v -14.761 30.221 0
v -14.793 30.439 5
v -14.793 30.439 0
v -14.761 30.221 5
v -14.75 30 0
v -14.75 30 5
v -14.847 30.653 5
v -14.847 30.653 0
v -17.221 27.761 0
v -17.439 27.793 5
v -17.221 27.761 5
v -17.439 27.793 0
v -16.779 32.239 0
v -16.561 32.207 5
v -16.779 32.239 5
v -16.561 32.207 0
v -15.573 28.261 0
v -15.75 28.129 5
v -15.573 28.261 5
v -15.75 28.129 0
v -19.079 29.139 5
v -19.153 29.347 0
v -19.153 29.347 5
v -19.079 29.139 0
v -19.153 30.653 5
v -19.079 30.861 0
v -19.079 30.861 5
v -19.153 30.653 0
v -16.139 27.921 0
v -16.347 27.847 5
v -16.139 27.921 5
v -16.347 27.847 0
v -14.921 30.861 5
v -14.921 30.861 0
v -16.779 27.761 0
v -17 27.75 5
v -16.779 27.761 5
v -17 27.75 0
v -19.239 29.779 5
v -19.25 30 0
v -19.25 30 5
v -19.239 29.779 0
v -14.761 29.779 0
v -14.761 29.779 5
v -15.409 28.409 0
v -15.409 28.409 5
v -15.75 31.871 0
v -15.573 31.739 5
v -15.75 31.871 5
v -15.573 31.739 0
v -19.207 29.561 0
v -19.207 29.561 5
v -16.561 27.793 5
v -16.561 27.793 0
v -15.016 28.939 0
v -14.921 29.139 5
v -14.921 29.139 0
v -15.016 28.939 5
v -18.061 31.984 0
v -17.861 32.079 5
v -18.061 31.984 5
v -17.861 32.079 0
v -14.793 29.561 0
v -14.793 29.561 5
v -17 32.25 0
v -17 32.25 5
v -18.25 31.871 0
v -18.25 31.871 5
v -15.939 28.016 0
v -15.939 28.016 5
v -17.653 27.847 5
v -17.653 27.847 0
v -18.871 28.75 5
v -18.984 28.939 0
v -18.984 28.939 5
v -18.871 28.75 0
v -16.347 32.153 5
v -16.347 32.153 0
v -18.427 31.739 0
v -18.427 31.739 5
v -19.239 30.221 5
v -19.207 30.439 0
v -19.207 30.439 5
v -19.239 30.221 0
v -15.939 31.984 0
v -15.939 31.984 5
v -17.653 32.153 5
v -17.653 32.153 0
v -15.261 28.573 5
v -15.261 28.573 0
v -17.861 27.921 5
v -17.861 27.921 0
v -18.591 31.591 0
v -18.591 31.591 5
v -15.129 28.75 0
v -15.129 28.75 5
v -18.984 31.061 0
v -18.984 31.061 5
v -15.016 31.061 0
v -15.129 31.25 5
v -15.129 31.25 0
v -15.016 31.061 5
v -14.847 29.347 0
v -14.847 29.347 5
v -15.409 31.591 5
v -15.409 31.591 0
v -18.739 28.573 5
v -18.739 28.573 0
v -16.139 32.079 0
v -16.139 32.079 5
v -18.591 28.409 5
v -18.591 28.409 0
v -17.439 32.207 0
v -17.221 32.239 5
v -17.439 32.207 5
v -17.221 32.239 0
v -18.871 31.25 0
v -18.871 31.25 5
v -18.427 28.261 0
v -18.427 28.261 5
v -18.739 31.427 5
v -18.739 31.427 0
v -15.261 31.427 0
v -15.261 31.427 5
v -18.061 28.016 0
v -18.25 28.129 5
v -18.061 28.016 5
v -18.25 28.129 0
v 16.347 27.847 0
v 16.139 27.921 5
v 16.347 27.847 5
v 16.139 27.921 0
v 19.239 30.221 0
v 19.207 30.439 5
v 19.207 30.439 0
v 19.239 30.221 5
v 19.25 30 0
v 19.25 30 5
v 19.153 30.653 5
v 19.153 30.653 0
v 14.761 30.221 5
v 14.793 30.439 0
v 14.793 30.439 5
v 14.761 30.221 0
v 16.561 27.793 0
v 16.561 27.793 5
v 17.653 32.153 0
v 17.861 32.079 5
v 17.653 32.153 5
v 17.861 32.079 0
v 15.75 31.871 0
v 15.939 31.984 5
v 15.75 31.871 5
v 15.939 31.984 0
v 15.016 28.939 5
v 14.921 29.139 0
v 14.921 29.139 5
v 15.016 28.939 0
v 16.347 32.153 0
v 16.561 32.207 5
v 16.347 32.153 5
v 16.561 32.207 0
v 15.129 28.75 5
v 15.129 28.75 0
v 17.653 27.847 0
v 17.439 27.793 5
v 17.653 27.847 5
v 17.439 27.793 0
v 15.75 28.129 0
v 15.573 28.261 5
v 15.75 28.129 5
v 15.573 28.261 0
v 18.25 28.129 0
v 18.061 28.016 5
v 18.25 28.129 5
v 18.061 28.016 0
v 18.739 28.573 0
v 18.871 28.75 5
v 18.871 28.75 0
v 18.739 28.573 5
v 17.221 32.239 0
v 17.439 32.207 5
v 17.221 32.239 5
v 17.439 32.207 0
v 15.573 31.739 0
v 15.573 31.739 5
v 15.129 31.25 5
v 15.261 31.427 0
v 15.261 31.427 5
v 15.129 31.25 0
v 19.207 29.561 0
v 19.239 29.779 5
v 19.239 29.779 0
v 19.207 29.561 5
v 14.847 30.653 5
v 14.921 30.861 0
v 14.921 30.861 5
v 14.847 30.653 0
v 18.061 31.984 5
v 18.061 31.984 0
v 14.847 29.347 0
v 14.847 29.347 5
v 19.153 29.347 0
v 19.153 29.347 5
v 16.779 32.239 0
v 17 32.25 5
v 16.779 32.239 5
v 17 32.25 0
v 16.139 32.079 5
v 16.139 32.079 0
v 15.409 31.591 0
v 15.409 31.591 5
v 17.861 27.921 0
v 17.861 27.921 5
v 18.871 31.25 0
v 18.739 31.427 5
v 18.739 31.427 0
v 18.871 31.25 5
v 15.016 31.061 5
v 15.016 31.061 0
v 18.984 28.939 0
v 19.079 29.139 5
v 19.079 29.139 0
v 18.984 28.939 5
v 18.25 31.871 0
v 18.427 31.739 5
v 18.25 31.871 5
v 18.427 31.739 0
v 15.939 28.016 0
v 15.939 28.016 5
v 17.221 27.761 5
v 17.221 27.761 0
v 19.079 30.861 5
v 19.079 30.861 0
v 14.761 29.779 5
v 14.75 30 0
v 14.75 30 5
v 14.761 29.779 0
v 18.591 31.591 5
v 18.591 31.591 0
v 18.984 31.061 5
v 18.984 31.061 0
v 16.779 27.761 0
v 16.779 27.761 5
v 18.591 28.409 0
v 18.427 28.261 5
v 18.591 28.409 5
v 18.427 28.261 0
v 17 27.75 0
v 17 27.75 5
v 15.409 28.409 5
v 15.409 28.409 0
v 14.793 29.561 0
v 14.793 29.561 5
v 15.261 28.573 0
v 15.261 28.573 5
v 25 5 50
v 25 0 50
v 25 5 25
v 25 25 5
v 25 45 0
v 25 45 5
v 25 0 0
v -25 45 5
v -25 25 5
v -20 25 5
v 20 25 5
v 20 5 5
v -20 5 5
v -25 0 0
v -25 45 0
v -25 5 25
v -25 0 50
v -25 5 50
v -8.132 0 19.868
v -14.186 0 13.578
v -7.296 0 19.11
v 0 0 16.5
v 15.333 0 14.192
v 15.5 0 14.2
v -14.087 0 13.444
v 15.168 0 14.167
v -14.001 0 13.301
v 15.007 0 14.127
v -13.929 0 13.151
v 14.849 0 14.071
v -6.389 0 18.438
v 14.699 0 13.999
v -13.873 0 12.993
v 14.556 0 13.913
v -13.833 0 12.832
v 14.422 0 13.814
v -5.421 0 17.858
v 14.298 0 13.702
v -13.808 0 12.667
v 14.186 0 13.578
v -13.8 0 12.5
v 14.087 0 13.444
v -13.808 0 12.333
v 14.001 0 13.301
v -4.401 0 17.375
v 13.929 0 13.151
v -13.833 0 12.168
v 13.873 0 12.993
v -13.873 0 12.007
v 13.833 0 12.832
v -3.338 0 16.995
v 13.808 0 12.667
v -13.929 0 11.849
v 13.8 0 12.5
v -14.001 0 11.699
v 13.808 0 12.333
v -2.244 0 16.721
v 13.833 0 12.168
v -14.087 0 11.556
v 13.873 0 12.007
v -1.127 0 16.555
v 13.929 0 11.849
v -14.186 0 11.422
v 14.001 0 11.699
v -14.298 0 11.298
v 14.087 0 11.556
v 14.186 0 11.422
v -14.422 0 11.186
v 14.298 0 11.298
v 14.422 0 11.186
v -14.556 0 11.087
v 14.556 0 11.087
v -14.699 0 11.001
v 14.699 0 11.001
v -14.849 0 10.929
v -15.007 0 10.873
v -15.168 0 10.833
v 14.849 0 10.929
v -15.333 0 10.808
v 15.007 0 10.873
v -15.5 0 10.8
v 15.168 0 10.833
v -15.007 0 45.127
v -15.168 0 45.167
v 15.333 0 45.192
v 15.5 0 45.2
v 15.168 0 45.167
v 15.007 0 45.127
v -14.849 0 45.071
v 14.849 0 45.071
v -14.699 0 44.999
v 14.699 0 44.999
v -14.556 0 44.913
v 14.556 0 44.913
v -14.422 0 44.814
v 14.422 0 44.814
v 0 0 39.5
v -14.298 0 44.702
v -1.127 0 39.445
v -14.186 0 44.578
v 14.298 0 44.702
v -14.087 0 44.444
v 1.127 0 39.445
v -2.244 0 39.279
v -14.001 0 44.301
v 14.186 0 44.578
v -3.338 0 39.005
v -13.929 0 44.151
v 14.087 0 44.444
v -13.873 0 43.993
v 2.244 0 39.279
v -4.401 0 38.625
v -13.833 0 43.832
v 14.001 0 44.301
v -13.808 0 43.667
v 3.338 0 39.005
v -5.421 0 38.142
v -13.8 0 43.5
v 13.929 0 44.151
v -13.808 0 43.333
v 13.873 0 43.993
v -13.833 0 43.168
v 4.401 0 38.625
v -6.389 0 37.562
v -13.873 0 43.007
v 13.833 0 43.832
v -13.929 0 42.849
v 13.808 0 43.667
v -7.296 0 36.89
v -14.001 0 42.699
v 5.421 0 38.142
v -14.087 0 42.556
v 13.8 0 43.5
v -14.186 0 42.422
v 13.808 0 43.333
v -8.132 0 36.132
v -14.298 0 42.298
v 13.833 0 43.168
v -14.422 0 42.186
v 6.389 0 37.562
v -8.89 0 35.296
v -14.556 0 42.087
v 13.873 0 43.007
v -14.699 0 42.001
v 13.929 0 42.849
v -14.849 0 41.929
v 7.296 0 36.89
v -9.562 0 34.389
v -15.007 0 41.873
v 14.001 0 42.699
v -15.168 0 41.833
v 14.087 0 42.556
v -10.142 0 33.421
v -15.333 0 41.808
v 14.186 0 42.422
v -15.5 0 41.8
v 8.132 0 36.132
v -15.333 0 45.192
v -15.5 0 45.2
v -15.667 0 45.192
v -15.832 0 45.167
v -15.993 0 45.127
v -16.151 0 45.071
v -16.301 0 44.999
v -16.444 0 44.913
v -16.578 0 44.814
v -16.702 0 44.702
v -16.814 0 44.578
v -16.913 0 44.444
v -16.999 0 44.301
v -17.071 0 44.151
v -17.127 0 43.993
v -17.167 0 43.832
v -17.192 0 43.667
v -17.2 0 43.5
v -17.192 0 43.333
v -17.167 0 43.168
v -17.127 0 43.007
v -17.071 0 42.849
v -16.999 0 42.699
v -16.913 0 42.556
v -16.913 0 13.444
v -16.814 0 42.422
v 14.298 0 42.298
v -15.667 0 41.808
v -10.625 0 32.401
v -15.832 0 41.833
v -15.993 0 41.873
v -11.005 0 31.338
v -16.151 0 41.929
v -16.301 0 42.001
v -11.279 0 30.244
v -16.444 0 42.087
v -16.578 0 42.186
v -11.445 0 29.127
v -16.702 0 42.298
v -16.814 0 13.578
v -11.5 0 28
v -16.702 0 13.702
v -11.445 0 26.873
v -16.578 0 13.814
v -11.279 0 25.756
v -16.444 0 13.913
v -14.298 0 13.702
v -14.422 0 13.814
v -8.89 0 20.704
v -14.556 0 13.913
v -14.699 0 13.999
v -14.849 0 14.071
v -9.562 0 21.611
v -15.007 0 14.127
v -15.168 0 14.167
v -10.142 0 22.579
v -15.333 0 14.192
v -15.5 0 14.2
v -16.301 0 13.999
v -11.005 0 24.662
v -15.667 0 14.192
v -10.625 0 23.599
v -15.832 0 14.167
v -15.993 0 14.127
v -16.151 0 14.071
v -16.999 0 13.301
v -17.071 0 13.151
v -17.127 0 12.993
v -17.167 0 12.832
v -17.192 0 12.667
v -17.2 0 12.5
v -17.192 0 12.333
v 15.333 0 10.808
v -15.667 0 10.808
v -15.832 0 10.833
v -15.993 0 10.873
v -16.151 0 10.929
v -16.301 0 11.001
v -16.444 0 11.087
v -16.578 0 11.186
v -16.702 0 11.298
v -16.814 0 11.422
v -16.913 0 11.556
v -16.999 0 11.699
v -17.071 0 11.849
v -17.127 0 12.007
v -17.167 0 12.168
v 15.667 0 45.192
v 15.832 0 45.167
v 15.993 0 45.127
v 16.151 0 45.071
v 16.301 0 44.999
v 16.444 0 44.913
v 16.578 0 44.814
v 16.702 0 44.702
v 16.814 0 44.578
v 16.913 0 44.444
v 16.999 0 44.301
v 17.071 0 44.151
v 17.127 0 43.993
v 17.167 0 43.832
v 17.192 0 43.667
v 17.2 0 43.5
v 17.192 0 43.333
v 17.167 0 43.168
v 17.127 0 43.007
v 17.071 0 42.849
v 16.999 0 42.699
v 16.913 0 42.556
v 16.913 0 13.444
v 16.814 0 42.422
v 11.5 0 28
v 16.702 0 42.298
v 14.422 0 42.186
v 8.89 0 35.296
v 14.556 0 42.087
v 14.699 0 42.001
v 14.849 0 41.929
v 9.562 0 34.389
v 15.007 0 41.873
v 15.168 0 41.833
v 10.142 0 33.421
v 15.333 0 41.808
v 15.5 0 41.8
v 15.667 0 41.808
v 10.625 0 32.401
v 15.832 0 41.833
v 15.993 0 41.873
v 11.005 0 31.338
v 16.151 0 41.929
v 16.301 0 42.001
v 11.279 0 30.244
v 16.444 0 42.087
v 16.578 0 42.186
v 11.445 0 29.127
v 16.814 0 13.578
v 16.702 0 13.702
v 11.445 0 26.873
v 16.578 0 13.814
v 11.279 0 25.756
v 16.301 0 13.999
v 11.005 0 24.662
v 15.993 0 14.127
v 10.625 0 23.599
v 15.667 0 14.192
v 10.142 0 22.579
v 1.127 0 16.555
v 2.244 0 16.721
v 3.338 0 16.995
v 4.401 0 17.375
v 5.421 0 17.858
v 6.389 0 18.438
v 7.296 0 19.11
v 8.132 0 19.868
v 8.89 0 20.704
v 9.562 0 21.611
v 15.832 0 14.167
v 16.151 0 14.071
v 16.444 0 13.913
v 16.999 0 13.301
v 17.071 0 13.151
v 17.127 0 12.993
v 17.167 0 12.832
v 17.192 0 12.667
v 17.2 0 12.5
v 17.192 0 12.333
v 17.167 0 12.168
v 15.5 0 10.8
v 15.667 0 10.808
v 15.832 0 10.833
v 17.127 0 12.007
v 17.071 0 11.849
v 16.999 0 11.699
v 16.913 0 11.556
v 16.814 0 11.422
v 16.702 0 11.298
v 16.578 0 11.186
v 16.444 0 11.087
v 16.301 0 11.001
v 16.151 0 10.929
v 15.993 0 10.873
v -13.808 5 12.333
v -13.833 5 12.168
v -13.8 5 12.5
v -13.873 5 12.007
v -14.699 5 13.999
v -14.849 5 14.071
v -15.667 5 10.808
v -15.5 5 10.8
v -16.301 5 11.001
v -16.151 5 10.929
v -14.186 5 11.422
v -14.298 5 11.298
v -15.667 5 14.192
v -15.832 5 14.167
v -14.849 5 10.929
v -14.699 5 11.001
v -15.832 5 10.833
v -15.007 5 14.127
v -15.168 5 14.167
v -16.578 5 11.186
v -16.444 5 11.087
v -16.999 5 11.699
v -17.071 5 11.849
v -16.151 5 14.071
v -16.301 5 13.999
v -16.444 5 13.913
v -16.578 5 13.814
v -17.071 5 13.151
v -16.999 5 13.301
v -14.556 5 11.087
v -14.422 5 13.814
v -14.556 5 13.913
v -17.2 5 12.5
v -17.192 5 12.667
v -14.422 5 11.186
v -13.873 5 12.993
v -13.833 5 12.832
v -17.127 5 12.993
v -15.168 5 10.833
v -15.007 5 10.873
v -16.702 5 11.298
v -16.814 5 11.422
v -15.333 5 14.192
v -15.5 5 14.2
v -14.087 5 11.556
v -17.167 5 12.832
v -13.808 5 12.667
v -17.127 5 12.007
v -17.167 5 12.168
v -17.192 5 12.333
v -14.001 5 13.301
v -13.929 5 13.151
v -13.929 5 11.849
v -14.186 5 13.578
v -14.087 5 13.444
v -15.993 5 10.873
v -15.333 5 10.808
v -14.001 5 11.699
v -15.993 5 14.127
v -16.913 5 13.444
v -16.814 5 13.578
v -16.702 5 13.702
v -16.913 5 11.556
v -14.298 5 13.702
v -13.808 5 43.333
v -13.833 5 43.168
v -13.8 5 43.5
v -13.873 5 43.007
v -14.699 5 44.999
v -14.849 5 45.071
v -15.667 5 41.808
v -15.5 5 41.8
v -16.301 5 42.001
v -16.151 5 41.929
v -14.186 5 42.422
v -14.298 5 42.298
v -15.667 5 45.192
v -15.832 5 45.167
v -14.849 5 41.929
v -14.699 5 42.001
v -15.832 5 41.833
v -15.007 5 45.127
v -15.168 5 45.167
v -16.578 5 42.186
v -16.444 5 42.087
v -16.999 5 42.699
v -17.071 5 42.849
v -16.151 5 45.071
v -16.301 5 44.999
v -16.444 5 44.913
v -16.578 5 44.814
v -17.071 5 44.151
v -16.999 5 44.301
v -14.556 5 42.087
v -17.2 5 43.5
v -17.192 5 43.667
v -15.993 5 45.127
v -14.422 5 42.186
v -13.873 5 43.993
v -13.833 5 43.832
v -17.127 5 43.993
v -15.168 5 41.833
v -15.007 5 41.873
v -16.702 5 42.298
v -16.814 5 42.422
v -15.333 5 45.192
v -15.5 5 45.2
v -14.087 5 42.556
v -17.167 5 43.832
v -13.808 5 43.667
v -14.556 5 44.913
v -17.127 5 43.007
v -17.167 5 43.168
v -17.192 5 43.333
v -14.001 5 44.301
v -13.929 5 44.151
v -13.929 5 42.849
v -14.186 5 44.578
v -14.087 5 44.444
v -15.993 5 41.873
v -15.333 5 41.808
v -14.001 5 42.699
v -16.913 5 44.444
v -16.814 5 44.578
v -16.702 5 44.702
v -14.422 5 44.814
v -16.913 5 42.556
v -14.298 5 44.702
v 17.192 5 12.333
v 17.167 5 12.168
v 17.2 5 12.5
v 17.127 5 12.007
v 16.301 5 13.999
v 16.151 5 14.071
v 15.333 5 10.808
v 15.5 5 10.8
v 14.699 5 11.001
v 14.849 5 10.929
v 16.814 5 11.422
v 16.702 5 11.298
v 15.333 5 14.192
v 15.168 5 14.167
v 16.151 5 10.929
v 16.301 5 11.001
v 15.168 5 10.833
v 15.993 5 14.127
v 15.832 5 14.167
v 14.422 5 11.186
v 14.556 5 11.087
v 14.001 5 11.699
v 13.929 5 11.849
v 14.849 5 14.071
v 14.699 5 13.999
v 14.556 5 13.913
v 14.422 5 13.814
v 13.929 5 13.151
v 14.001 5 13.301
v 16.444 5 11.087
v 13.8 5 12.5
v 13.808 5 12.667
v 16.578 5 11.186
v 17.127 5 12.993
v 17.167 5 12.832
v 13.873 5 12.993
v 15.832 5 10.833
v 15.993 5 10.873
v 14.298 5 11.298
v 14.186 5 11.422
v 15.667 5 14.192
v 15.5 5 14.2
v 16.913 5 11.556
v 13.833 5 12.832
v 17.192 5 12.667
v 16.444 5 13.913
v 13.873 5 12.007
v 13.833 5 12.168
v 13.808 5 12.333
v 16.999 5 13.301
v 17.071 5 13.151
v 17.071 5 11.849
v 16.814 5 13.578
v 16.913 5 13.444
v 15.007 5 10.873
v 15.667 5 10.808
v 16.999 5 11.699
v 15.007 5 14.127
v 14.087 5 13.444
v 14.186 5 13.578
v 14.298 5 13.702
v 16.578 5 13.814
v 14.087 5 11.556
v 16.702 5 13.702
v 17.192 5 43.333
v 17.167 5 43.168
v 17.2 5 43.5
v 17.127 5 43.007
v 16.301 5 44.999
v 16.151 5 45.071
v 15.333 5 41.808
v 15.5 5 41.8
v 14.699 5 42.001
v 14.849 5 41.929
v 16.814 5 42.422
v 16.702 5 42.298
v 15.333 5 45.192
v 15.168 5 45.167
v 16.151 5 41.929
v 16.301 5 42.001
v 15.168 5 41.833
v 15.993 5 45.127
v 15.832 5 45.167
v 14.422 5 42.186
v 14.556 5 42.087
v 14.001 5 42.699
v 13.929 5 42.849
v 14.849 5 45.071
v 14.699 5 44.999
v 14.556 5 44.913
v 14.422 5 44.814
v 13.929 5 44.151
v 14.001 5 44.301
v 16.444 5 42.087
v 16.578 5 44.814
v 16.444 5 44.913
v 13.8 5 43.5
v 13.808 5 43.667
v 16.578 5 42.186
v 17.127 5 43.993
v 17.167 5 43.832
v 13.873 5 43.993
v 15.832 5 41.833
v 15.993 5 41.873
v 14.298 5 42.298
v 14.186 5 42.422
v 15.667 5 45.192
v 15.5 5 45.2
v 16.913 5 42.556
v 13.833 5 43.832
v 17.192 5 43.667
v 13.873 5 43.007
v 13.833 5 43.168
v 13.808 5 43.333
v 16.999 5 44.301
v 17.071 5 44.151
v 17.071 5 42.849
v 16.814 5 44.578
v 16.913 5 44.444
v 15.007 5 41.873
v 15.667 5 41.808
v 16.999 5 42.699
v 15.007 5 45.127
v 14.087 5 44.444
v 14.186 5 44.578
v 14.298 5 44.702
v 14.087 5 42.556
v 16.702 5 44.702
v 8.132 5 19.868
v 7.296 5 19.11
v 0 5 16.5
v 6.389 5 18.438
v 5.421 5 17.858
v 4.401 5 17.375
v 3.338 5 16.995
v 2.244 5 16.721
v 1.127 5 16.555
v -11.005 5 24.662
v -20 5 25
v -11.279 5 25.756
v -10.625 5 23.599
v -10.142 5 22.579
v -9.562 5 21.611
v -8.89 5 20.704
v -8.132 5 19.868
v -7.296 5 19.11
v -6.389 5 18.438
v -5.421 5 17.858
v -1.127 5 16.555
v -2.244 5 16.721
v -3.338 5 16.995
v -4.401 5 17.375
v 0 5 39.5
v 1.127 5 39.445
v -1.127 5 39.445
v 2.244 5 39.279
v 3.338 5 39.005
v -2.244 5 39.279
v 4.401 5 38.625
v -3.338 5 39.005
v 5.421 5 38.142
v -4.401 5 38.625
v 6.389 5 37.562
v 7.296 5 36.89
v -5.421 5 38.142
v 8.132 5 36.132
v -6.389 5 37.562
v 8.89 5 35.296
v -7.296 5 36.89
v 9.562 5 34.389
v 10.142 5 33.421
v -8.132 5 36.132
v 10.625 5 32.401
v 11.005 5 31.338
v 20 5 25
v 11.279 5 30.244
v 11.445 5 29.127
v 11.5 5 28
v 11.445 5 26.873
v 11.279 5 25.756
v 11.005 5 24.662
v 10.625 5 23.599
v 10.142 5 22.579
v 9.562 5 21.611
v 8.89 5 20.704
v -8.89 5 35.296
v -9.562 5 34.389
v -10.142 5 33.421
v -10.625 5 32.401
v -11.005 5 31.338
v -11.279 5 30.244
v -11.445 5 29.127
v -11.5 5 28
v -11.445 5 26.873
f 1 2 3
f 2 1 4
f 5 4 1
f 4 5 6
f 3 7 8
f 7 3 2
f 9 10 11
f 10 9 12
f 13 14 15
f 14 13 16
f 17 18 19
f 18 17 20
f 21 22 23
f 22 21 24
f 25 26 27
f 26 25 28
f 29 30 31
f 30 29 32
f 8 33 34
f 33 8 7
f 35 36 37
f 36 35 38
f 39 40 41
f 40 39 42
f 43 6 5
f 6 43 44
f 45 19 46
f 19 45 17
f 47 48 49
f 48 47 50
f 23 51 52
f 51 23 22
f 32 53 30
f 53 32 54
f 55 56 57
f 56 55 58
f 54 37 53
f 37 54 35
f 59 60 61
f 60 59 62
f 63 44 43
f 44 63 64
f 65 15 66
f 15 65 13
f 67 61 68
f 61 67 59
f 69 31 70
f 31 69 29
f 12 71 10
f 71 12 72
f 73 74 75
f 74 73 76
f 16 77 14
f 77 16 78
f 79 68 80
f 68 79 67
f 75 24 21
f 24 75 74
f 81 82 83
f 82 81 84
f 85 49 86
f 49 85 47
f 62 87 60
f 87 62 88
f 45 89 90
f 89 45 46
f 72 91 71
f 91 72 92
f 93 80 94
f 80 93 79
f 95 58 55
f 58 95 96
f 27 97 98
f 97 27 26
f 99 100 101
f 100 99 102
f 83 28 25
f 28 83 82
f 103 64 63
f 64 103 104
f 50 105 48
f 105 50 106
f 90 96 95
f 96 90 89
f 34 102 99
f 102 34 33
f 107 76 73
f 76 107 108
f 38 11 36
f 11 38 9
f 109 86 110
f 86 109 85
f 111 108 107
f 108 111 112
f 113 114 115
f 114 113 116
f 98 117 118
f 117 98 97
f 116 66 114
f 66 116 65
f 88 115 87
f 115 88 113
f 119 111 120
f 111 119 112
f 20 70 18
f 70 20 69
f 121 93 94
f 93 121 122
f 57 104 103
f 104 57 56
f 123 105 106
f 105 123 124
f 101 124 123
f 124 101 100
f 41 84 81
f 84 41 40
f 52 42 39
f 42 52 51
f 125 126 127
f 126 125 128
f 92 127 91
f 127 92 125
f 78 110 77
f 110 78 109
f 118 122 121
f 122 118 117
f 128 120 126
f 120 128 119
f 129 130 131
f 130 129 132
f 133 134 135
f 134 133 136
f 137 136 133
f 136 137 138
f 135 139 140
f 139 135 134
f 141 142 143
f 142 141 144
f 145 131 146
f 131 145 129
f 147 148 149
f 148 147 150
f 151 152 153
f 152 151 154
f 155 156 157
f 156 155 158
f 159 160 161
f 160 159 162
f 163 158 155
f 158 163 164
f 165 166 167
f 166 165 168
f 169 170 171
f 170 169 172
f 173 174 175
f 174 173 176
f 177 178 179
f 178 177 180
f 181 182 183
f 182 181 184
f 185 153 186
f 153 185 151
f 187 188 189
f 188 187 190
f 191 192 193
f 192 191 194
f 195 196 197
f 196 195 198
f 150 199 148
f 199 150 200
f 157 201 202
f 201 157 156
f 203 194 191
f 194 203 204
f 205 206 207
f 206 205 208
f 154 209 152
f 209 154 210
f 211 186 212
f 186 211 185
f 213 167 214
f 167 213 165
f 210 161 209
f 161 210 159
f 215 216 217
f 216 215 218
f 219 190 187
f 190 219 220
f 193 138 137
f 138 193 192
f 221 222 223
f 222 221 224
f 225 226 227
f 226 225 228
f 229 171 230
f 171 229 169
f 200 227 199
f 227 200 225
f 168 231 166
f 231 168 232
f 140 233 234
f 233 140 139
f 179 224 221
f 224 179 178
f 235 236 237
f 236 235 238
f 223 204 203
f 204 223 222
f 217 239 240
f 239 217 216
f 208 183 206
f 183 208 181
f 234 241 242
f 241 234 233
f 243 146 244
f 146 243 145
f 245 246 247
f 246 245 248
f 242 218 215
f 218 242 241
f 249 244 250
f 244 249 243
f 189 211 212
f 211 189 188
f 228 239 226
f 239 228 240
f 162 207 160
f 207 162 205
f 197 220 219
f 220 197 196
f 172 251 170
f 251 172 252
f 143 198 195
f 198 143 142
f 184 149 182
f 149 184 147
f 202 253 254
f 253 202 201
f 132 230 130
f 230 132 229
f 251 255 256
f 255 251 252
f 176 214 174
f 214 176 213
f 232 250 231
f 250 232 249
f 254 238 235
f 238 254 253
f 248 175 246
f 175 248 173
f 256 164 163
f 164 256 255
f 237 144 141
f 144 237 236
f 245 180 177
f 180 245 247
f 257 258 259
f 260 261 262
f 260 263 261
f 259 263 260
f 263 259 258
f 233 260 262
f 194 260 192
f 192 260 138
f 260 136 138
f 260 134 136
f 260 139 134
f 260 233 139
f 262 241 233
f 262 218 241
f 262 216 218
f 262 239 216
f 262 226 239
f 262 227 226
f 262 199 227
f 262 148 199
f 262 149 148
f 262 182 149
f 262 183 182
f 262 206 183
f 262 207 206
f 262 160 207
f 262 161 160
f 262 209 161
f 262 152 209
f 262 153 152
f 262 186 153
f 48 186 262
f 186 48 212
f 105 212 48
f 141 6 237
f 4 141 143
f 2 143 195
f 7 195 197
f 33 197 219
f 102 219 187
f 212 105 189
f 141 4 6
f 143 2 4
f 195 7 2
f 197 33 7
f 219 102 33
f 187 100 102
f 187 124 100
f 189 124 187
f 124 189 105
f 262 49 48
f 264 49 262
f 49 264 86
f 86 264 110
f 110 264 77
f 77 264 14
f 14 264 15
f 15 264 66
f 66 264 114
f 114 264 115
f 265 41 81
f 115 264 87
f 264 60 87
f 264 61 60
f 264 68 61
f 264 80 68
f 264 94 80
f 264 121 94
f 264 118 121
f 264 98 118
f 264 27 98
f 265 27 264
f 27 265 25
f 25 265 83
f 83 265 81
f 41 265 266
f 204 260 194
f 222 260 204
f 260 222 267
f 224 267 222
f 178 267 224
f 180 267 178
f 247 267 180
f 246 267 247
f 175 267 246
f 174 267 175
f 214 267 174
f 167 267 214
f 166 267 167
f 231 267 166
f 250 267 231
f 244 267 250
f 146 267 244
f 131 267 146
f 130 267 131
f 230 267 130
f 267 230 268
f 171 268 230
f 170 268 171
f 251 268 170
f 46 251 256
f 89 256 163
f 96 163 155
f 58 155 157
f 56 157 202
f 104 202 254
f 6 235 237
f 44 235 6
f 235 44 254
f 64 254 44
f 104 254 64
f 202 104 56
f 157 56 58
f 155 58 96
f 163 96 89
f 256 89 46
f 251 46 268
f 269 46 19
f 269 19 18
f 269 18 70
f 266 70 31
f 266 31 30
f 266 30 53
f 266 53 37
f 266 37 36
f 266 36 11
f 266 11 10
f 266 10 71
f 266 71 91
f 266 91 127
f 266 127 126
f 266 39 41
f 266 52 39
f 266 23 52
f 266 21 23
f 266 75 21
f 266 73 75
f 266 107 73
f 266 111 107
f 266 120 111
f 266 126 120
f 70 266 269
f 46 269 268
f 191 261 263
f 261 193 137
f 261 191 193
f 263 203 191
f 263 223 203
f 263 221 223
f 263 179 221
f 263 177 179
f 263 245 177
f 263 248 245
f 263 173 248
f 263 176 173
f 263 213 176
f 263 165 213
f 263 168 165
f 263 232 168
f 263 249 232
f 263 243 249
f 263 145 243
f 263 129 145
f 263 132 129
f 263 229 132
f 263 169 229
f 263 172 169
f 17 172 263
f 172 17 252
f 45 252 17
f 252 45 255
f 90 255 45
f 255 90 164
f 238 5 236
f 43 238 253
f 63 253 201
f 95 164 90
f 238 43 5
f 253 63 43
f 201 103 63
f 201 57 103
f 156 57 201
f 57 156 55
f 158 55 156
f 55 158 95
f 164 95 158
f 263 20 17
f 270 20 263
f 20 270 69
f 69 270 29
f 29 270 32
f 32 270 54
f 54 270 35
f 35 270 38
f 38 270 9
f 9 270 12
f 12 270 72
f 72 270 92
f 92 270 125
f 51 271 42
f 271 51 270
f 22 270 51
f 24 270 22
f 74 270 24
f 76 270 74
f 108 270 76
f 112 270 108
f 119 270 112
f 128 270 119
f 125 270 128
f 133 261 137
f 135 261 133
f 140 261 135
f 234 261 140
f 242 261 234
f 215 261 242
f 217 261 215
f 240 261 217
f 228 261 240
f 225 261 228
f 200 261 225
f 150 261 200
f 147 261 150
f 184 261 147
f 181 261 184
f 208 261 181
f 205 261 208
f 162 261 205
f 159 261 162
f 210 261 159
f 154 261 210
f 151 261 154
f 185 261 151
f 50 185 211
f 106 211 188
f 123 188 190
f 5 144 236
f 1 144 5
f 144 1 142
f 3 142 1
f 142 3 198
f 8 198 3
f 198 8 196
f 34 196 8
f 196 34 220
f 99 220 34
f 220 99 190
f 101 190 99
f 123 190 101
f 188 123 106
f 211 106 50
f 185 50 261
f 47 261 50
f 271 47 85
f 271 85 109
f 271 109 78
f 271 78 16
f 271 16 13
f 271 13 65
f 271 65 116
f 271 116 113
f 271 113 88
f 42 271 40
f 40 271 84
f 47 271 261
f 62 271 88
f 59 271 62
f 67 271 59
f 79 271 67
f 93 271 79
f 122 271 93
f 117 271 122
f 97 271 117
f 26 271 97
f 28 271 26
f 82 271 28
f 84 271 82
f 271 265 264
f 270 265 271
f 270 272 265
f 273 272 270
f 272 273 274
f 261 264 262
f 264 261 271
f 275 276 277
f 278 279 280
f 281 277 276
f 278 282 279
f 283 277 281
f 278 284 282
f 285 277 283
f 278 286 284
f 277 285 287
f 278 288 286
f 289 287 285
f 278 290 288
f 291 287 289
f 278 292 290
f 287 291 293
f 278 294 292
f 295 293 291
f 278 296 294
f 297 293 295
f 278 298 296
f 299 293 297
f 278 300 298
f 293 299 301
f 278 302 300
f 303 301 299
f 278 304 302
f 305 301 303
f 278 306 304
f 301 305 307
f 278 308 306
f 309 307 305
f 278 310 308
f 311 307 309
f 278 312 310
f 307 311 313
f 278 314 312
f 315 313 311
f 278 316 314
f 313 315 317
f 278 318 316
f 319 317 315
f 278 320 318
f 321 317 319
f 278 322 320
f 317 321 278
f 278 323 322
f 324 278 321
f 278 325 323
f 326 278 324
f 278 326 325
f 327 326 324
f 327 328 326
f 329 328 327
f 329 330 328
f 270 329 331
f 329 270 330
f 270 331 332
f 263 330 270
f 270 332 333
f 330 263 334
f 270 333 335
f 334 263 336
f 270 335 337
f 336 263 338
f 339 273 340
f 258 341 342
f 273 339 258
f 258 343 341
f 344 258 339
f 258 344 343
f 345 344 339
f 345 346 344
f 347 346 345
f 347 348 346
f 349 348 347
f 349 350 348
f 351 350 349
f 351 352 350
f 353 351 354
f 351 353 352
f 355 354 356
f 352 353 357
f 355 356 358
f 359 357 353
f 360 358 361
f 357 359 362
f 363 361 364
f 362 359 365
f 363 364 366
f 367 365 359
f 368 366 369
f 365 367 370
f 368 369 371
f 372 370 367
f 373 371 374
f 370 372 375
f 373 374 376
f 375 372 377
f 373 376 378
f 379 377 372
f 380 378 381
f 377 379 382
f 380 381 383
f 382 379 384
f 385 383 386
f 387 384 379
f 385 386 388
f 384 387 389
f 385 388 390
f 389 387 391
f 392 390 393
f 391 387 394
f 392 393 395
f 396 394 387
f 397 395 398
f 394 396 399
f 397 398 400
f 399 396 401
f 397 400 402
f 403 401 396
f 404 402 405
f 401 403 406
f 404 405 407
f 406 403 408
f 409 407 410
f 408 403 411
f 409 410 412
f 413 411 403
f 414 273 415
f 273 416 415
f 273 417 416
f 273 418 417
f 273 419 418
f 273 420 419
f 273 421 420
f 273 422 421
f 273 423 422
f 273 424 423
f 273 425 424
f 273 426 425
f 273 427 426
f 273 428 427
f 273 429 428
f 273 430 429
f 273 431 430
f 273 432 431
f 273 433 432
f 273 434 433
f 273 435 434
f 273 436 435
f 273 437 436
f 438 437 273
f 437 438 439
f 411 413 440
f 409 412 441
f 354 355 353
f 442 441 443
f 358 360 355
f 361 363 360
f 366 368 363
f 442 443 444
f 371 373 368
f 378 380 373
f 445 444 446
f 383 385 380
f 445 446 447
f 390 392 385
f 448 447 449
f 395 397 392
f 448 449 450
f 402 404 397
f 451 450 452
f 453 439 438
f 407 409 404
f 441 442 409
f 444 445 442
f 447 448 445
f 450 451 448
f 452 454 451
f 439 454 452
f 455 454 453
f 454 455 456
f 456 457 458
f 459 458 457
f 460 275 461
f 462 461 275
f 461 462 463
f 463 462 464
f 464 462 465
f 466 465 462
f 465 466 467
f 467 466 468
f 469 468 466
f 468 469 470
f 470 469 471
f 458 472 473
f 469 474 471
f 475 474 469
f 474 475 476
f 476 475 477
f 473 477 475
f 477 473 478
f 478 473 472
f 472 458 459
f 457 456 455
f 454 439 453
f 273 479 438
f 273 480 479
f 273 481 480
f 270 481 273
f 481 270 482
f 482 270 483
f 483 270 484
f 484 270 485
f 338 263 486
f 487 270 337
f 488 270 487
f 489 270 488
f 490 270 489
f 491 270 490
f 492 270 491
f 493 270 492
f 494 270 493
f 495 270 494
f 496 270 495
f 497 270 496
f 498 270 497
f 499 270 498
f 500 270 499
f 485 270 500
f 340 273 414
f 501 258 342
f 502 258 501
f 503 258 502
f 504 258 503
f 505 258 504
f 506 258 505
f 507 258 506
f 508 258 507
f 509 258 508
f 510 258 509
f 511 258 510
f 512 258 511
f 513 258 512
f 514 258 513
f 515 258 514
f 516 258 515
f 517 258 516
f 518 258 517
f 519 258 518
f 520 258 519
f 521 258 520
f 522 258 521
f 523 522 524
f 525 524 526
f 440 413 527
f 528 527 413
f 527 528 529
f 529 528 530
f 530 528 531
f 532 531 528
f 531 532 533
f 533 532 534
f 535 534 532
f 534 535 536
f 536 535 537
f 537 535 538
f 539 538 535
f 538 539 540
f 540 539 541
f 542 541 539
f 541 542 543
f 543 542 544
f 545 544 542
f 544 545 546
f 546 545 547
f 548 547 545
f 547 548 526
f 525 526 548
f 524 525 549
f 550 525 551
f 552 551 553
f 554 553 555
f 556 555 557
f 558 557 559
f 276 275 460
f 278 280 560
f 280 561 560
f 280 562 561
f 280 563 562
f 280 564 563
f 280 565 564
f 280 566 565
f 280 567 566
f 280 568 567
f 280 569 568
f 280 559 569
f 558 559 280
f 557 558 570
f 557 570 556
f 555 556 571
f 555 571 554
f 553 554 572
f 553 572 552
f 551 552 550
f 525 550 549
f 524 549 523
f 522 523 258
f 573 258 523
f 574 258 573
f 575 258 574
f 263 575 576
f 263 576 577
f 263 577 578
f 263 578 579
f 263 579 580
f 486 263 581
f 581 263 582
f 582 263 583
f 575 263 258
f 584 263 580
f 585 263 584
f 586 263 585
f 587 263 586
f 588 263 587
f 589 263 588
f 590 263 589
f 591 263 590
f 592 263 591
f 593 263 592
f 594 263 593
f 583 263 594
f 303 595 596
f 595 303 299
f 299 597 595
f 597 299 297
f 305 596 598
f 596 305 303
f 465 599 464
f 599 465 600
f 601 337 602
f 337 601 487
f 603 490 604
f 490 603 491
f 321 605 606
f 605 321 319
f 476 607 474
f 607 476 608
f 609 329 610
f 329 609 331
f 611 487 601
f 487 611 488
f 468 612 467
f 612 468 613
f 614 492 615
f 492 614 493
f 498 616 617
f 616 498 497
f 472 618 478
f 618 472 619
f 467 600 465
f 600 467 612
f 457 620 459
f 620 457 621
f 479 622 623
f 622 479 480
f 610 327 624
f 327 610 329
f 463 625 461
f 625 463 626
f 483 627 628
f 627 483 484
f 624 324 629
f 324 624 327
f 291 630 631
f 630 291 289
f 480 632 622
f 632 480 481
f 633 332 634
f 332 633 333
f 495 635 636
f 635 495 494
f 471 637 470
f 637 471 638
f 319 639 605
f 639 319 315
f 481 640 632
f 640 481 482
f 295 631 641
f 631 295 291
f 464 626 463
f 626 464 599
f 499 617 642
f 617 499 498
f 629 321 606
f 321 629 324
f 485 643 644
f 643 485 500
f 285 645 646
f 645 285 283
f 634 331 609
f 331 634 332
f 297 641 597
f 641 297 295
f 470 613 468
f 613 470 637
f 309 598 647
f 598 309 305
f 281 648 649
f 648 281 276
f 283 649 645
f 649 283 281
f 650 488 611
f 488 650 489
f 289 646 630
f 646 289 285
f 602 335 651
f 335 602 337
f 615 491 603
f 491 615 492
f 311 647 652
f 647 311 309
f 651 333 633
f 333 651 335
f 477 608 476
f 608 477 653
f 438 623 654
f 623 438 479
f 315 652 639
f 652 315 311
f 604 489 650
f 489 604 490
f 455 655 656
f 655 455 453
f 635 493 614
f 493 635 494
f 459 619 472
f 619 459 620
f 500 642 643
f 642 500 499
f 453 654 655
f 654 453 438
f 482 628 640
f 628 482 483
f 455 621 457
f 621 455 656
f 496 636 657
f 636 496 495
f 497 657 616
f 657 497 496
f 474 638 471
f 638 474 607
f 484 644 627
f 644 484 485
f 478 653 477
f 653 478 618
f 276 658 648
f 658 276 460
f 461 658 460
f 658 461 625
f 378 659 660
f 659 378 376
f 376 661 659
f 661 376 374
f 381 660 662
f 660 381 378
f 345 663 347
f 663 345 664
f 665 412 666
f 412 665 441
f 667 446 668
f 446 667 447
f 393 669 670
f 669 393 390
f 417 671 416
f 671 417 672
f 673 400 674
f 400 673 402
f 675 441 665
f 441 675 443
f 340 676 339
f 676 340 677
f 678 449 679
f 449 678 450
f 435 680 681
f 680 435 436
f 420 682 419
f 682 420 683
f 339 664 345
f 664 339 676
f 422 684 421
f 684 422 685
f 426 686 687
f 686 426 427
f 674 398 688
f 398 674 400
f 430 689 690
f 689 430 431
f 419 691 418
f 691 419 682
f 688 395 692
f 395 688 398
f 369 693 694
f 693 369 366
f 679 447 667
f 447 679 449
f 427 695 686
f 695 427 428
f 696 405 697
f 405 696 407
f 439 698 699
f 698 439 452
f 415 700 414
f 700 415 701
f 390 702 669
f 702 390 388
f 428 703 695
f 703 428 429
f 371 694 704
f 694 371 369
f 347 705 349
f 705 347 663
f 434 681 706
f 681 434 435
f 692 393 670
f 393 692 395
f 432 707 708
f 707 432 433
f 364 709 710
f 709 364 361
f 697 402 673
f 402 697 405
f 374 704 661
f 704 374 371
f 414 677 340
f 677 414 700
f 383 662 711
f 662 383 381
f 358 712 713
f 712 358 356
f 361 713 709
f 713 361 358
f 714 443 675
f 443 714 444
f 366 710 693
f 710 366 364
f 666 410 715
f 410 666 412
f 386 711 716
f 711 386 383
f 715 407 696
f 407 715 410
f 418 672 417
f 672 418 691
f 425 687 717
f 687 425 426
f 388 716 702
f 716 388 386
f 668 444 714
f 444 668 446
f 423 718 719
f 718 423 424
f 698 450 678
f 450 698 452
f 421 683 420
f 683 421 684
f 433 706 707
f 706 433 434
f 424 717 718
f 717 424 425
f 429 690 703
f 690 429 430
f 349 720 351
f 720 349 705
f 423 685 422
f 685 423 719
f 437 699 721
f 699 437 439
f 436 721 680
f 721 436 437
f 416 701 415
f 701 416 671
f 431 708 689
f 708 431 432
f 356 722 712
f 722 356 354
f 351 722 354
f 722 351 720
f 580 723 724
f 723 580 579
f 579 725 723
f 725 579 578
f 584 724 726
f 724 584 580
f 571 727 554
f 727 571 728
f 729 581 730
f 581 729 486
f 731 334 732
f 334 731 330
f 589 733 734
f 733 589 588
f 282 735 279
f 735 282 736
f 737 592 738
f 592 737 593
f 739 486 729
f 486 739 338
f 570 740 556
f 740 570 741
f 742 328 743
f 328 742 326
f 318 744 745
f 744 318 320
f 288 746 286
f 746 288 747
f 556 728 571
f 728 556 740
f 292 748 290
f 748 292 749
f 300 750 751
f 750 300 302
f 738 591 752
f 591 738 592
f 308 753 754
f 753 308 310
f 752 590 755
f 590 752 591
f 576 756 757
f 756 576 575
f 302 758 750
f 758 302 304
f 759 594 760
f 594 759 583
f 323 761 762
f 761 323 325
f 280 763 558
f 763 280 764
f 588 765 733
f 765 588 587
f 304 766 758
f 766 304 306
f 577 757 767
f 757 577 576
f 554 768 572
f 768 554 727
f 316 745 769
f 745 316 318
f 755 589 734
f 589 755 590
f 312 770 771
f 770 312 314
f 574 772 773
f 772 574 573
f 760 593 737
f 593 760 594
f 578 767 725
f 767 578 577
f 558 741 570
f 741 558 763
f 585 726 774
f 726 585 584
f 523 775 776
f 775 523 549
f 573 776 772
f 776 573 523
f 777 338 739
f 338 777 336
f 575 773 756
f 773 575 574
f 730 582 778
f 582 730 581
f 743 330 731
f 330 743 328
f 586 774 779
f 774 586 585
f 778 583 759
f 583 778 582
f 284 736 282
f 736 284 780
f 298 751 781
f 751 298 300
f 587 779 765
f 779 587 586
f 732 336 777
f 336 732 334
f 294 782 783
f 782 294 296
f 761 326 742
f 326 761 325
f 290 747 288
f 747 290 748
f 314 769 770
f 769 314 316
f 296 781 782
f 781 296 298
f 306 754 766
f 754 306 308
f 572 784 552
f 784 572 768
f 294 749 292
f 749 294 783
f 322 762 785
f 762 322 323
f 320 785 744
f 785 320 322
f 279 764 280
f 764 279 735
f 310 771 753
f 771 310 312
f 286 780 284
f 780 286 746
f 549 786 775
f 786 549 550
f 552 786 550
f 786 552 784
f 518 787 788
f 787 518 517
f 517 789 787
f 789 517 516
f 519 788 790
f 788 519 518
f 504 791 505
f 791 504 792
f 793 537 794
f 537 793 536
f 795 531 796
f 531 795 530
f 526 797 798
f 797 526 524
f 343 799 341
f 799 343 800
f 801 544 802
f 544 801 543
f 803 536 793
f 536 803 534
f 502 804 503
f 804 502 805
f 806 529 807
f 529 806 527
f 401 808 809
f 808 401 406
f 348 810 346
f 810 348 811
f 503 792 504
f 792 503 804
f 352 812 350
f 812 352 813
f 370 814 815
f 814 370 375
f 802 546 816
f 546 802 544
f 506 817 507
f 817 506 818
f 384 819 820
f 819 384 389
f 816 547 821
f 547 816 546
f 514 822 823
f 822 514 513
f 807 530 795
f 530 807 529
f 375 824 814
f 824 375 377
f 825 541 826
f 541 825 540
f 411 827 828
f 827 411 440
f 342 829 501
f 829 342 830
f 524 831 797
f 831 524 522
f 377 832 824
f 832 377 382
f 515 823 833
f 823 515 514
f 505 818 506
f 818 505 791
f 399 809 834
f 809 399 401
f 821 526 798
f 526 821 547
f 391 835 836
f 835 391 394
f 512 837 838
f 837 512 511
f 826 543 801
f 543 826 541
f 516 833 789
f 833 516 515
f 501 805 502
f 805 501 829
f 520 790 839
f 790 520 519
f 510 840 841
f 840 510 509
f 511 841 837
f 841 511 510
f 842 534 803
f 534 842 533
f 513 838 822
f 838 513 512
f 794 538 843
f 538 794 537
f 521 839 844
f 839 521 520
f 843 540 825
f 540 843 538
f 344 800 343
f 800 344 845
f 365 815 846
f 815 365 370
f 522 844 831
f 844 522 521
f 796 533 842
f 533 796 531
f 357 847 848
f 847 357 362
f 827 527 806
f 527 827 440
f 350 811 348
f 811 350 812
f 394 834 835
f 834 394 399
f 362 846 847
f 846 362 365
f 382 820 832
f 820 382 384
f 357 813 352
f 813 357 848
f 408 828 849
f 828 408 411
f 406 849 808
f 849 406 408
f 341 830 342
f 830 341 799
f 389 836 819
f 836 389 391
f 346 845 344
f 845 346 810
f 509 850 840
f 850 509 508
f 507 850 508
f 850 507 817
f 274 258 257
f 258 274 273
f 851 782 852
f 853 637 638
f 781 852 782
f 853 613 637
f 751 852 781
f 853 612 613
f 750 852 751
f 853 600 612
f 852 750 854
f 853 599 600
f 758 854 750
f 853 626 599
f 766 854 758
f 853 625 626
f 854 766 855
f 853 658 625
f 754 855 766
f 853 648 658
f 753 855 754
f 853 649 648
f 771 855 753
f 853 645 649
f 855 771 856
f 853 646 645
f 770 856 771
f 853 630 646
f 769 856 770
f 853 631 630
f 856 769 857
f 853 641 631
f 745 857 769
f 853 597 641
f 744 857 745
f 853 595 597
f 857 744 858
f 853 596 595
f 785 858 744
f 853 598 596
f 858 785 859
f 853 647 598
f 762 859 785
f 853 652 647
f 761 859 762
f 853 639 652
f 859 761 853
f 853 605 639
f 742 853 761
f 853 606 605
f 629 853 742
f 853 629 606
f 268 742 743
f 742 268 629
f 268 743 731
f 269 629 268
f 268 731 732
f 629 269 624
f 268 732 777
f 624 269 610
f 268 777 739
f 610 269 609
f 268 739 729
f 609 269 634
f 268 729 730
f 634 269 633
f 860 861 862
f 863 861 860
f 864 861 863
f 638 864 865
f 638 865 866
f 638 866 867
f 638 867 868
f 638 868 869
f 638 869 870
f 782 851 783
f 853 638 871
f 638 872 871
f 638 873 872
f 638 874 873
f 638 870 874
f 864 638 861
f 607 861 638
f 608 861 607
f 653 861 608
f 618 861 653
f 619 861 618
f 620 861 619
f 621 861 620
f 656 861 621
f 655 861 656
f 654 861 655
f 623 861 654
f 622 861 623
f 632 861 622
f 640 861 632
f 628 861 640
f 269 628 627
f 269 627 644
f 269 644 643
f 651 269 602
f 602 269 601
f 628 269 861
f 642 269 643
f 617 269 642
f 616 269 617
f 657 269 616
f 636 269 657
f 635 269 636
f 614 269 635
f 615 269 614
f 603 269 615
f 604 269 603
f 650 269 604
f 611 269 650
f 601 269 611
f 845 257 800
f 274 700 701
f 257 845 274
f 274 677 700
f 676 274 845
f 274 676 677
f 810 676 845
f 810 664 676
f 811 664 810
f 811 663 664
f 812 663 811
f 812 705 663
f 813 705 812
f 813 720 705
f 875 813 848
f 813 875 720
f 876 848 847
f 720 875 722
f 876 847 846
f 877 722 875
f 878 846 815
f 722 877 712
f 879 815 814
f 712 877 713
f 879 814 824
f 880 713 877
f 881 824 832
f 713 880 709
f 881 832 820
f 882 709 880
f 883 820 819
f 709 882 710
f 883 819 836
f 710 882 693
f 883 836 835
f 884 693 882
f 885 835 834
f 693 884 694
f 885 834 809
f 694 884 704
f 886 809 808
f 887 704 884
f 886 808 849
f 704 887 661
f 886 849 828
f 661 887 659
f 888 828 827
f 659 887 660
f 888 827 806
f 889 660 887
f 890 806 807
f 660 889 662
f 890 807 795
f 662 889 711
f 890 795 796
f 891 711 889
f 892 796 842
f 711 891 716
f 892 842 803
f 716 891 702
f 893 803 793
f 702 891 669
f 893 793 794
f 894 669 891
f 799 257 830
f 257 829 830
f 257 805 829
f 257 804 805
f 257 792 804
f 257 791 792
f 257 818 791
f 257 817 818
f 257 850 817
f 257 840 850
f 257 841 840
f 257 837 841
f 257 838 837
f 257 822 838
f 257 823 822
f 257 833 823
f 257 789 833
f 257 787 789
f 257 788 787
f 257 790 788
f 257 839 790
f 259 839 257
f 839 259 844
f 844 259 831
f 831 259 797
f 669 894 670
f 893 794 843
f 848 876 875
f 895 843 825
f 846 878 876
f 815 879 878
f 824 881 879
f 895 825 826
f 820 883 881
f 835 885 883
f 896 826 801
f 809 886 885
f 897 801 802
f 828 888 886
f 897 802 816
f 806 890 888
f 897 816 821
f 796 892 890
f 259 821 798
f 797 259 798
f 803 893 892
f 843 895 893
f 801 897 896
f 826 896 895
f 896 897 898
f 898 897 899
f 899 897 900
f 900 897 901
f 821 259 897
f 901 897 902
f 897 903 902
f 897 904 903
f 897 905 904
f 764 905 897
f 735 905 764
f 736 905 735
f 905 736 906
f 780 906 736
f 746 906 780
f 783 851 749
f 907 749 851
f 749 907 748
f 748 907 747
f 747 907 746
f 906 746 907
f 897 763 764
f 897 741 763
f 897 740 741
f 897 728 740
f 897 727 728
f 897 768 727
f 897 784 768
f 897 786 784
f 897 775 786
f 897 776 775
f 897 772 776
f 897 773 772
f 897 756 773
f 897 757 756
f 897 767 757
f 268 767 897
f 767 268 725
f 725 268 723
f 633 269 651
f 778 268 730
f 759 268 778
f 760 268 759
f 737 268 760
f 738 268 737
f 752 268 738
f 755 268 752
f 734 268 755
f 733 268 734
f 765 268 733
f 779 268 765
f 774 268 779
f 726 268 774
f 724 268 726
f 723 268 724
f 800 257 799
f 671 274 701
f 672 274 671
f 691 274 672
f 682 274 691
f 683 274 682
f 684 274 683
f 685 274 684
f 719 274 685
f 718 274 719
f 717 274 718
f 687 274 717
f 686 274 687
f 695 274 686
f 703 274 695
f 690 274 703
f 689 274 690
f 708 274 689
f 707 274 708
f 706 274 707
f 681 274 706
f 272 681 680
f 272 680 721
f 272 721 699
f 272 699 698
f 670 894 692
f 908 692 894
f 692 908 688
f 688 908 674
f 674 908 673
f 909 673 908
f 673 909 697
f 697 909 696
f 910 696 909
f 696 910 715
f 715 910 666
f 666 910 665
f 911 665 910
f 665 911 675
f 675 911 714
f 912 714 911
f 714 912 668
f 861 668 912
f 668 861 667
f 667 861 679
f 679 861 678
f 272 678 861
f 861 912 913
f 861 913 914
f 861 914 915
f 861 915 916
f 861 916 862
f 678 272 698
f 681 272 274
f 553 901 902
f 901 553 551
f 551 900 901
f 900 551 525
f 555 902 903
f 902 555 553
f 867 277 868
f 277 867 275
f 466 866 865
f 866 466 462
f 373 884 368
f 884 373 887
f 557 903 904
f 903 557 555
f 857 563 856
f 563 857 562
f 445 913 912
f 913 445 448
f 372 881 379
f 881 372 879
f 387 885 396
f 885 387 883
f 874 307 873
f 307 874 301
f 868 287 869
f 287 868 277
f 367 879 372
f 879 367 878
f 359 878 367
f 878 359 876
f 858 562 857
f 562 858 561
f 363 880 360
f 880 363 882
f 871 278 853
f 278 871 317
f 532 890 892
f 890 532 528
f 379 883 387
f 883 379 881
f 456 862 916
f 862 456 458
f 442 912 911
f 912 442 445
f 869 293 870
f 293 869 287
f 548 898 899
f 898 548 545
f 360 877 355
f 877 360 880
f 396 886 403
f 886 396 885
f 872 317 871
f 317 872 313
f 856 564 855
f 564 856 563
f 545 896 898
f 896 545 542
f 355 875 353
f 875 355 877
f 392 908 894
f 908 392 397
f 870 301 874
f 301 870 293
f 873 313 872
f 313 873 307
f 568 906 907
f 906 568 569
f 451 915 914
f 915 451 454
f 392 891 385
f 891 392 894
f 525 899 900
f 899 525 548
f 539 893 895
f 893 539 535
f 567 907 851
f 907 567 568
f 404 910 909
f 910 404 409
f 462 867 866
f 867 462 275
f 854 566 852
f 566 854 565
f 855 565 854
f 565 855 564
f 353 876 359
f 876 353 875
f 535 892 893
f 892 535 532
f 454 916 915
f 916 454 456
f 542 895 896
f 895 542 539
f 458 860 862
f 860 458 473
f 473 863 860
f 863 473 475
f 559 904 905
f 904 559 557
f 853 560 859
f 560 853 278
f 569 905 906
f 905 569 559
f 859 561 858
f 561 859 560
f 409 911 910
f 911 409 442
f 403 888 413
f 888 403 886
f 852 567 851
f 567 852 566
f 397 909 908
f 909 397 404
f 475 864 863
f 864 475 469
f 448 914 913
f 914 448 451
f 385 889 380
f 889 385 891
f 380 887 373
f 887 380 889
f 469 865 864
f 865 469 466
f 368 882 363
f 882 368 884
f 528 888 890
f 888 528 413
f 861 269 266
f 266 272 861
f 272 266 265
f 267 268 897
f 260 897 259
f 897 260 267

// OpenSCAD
// NEMA 17 L-shaped mounting bracket (e.g. for syringe pump)
// Print orientation: base plate on the bed (z = 0), motor plate standing at back edge.

$fn = 64;

// ---------------- Base plate ----------------
base_x_min   = -25;   // left edge of base [mm]
base_x_max   =  25;   // right edge of base [mm]
base_y_min   =   0;   // back edge of base [mm]
base_y_max   =  45;   // front edge of base [mm]
base_t       =   5;   // base plate thickness (z) [mm]

base_hole_d  = 4.5;   // M4 clearance hole diameter [mm]
base_hole_x  =  17;   // |x| of base mounting holes [mm]
base_hole_y  =  30;   // y of base mounting holes [mm]

// ---------------- Motor plate ----------------
mp_y_min     =   0;   // back face of motor plate [mm]
mp_t         =   5;   // motor plate thickness (y) [mm]
mp_h         =  50;   // motor plate height (z) [mm]

boss_d       =  23;   // NEMA 17 centring boss hole diameter [mm]
boss_x       =   0;   // boss centre x [mm]
boss_z       =  28;   // boss centre z [mm]

screw_d      = 3.4;   // M3 clearance hole diameter [mm]
screw_pitch  =  31;   // NEMA 17 square hole pattern [mm]

// ---------------- Gussets ----------------
gusset_t     =   5;   // gusset thickness (x) [mm]
gusset_leg   =  20;   // gusset leg length along +Y and +Z [mm]
gusset_y0    =   5;   // right-angle corner y [mm]
gusset_z0    =   5;   // right-angle corner z [mm]

eps          = 0.5;   // cutter overshoot [mm]

base_w = base_x_max - base_x_min;

// ---------------- Modules ----------------
module base_plate() {
    difference() {
        translate([base_x_min, base_y_min, 0])
            cube([base_w, base_y_max - base_y_min, base_t]);
        for (sx = [-1, 1])
            translate([sx * base_hole_x, base_hole_y, -eps])
                cylinder(d = base_hole_d, h = base_t + 2 * eps);
    }
}

// cylinder cutter running along +Y through the motor plate
module y_hole(x, z, d) {
    translate([x, mp_y_min - eps, z])
        rotate([-90, 0, 0])
            cylinder(d = d, h = mp_t + 2 * eps);
}

module motor_plate() {
    difference() {
        translate([base_x_min, mp_y_min, 0])
            cube([base_w, mp_t, mp_h]);
        // centring boss hole
        y_hole(boss_x, boss_z, boss_d);
        // M3 screw holes on square pattern
        for (sx = [-1, 1], sz = [-1, 1])
            y_hole(boss_x + sx * screw_pitch / 2,
                   boss_z + sz * screw_pitch / 2,
                   screw_d);
    }
}

// right-triangle gusset in YZ plane, extruded along +X starting at x0
module gusset(x0) {
    translate([x0, 0, 0])
        rotate([90, 0, 90])   // polygon X->Y, polygon Y->Z, extrude->X
            linear_extrude(height = gusset_t)
                polygon([
                    [gusset_y0,              gusset_z0],
                    [gusset_y0 + gusset_leg, gusset_z0],
                    [gusset_y0,              gusset_z0 + gusset_leg]
                ]);
}

// ---------------- Assembly ----------------
union() {
    base_plate();
    motor_plate();
    gusset(base_x_min);                 // x = -25 .. -20
    gusset(base_x_max - gusset_t);      // x =  20 ..  25
}
